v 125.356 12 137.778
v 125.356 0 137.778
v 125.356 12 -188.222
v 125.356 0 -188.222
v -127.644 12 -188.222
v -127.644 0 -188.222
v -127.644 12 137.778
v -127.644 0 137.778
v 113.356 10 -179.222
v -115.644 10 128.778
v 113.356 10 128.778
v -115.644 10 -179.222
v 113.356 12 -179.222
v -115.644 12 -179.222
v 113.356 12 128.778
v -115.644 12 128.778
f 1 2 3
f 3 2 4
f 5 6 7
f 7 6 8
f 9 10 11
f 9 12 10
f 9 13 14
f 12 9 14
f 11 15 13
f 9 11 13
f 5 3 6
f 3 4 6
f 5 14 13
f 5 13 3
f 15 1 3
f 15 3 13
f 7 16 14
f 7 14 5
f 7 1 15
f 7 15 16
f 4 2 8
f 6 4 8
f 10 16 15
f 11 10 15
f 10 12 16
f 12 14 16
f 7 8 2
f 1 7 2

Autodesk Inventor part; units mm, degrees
ref_plane "YZ Plane" through (0, 0, 0) normal (1, 0, 0) x (0, 1, 0)
ref_plane "XZ Plane" through (0, 0, 0) normal (0, 1, 0) x (-1, 0, 0)
ref_plane "XY Plane" through (0, 0, 0) normal (0, 0, 1) x (1, 0, 0)
sketch "Esboço1" plane through (0, 0, 0) normal (0, 1, 0) x (-1, 0, 0)
  line L0 (127.6443, 137.7783) -> (-125.3557, 137.7783)
  line L1 (-125.3557, 137.7783) -> (-125.3557, -188.2217)
  line L2 (-125.3557, -188.2217) -> (127.6443, -188.2217)
  line L3 (127.6443, -188.2217) -> (127.6443, 137.7783)
  point P0 (0, 0)
  dimension "d0" = 326
  dimension "d1" = 253
extrude "Extrusão1" add sketch "Esboço1" along normal blind 12
sketch "Esboço2" plane through (0, 12, 0) normal (0, 1, 0) x (1, 0, 0)
  line L0 (-115.6443, -128.7783) -> (113.3557, -128.7783)
  line L1 (113.3557, -128.7783) -> (113.3557, 179.2217)
  line L2 (113.3557, 179.2217) -> (-115.6443, 179.2217)
  line L3 (-115.6443, 179.2217) -> (-115.6443, -128.7783)
  line L4 (-127.6443, -137.7783) -> (125.3557, -137.7783) projected
  line L5 (125.3557, 188.2217) -> (-127.6443, 188.2217) projected
  line L6 (-127.6443, 188.2217) -> (-127.6443, -137.7783) projected
  line L7 (125.3557, -137.7783) -> (125.3557, 188.2217) projected
  point P0 (0, 0)
  dimension "d4" = 9
  dimension "d5" = 9
  dimension "d6" = 12
  dimension "d7" = 12
extrude "Extrusão2" cut sketch "Esboço2" against normal blind 2 contours L3 L2 L1 L0
properties part number "tela"
